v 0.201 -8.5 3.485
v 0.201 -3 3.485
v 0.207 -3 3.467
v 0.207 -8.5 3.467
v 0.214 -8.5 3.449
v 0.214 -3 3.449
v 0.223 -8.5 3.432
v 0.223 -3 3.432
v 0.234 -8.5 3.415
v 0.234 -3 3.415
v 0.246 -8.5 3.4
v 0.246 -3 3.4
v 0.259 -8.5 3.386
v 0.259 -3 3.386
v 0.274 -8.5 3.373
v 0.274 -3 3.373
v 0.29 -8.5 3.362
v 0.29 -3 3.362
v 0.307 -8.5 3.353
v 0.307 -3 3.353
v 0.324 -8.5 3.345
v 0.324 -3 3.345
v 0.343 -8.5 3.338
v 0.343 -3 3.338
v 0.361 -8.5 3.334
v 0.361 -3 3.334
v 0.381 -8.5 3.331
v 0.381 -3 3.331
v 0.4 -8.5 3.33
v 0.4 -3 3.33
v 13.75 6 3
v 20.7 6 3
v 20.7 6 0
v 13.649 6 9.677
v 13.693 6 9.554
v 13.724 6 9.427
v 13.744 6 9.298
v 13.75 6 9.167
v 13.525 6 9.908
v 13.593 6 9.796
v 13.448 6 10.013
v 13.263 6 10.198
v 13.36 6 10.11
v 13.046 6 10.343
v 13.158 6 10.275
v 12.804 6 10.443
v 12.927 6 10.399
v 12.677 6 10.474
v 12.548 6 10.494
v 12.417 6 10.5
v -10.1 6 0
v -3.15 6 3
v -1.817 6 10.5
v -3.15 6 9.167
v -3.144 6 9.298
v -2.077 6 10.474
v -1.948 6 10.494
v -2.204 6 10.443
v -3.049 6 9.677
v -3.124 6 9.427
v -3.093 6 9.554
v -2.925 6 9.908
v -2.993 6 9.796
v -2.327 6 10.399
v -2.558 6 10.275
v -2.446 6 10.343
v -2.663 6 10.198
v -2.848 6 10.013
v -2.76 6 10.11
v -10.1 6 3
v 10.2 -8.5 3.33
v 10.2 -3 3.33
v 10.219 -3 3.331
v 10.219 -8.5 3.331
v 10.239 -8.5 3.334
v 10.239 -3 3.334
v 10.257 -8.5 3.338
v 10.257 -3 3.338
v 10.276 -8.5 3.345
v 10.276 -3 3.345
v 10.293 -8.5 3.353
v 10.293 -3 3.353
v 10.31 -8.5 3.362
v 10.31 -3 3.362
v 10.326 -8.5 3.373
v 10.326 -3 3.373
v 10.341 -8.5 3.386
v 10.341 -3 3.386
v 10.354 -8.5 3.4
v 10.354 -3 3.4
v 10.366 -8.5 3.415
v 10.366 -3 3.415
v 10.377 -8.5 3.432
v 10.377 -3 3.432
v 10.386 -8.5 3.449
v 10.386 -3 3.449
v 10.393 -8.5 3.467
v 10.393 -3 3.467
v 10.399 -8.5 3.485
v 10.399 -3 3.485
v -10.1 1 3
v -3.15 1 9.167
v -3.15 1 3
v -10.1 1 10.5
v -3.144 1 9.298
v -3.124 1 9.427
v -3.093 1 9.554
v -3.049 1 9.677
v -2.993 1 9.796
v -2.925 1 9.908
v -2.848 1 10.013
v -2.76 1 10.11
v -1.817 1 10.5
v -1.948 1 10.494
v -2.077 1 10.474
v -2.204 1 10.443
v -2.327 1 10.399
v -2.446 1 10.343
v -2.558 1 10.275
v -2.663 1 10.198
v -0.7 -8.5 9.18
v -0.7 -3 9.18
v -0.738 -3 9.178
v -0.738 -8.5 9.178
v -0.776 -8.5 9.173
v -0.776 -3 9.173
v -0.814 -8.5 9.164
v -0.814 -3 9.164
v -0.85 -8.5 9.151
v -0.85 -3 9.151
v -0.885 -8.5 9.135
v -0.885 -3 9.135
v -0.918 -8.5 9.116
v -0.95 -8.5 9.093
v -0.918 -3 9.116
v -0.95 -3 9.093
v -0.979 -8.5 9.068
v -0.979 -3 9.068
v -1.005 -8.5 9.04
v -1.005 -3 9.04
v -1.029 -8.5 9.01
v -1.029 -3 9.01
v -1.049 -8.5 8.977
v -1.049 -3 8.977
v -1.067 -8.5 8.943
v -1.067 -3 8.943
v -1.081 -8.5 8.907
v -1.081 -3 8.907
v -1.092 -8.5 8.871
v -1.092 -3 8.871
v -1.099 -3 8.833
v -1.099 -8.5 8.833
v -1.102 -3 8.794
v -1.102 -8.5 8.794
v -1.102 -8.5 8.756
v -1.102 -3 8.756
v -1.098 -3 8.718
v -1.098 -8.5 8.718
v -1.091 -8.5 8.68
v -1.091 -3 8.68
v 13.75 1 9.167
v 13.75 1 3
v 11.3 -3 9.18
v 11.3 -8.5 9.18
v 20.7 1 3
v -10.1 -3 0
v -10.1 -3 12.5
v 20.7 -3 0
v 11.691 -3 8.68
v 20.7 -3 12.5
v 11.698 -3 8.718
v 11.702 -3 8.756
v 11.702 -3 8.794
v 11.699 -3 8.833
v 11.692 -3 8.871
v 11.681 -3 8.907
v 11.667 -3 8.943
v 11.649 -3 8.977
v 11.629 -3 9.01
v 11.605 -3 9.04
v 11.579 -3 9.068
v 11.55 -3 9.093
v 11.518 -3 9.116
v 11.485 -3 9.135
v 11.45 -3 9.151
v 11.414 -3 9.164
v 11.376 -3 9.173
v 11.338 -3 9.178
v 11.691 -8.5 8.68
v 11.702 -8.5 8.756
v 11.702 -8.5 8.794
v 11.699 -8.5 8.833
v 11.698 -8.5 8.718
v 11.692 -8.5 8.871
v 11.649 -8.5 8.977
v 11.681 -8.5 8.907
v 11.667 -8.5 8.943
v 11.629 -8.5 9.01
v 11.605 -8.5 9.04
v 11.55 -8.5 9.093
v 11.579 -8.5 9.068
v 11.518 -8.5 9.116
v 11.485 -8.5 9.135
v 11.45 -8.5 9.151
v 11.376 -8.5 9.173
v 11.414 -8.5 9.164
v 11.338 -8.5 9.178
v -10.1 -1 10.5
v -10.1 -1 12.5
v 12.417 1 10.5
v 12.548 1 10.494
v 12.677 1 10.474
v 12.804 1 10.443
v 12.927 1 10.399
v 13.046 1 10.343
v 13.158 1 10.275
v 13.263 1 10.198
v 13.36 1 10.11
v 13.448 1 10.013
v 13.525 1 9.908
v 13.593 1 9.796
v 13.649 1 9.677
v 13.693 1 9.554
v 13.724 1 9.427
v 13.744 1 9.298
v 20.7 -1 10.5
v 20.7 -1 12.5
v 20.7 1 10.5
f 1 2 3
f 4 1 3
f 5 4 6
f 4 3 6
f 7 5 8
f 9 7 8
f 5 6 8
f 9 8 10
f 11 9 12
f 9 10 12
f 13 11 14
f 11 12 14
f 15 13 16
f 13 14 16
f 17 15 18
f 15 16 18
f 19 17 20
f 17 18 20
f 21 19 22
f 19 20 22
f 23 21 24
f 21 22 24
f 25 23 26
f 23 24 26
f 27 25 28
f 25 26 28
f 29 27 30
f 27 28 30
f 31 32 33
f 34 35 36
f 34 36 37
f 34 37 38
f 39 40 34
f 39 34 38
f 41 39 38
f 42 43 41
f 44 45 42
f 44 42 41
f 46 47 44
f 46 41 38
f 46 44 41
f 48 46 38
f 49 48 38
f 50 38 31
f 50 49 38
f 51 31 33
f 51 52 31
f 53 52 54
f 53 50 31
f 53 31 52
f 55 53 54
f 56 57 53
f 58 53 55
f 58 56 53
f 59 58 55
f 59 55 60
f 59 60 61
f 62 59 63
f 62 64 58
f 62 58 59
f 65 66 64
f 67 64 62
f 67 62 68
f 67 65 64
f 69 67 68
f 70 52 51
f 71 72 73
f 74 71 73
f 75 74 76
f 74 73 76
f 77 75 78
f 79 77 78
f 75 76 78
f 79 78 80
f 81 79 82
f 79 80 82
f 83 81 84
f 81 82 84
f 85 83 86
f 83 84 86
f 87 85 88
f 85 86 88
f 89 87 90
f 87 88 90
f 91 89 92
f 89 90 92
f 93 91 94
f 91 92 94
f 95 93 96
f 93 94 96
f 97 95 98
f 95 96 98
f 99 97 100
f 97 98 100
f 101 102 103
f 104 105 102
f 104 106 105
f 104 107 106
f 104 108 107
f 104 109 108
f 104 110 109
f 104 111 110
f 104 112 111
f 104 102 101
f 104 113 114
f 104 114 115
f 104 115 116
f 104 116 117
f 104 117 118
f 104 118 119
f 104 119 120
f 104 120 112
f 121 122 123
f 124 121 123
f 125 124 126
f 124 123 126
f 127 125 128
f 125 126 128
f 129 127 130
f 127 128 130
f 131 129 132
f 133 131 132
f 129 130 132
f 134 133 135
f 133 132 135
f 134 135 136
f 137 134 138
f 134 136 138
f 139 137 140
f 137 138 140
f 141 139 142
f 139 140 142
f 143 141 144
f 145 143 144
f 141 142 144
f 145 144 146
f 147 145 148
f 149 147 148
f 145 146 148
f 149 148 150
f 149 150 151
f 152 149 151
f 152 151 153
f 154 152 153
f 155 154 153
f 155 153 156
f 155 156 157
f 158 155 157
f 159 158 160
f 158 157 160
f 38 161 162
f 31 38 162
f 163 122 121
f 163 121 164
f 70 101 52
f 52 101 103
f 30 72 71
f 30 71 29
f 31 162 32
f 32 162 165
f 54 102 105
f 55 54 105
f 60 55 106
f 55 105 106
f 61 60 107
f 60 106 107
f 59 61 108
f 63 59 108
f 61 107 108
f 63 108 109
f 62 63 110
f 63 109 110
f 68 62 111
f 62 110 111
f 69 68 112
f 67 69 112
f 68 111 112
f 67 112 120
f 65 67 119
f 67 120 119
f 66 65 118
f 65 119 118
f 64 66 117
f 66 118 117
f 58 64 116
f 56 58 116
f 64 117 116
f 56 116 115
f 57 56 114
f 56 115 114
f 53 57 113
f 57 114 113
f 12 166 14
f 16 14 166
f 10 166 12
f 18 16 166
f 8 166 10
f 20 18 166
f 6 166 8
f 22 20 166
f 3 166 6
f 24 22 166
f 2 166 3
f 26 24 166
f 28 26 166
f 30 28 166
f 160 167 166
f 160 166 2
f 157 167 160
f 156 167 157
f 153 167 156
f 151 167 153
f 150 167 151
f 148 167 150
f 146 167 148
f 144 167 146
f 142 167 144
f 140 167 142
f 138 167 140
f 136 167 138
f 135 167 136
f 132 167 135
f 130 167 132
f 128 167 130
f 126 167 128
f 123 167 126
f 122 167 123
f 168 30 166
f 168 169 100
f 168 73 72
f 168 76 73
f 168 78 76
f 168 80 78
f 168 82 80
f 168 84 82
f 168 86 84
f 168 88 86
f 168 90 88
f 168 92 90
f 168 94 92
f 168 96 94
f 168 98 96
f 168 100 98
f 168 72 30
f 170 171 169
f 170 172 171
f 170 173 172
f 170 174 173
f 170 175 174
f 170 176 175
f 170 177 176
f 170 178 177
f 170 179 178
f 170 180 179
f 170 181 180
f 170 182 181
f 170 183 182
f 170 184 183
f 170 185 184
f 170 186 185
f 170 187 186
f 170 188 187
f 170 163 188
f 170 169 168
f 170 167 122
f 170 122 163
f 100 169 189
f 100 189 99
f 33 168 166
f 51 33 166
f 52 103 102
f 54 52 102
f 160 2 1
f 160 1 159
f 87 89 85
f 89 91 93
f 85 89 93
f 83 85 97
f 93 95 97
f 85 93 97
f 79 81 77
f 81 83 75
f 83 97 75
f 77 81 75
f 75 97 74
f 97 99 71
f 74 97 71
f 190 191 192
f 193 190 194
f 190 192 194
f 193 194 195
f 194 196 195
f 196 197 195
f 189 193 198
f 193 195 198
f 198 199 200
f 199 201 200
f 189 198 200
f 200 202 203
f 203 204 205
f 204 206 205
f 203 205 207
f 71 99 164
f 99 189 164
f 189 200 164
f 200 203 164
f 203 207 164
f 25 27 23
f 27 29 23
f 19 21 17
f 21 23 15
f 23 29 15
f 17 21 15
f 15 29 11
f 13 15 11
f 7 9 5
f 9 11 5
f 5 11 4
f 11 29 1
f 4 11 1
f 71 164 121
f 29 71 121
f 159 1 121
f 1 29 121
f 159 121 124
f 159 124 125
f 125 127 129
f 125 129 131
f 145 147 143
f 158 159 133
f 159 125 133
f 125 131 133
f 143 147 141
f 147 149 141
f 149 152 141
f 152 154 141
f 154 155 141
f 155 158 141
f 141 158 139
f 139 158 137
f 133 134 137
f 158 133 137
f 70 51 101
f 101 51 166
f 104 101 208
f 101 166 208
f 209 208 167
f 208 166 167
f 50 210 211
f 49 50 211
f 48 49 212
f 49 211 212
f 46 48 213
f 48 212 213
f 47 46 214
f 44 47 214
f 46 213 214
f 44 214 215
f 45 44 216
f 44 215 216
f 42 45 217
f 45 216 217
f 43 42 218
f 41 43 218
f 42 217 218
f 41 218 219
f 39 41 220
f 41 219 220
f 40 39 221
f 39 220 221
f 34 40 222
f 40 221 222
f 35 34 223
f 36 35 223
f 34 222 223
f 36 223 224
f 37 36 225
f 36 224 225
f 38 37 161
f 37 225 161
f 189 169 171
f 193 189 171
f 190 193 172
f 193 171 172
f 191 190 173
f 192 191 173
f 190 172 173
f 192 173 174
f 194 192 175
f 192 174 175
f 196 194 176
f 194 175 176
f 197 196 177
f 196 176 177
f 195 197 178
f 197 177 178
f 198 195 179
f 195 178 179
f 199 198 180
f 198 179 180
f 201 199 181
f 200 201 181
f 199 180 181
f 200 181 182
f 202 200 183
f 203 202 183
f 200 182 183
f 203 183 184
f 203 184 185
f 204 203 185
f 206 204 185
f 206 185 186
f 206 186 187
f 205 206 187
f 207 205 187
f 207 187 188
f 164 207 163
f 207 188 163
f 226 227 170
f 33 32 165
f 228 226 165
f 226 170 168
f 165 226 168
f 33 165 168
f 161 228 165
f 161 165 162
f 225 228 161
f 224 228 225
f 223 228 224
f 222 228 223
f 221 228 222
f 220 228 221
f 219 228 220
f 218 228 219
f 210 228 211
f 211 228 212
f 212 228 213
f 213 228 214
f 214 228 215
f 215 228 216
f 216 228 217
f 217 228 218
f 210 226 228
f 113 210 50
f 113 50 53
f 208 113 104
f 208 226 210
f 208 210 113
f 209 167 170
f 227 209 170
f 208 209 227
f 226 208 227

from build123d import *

# Parameters (mm, degrees)
SKETCH008_W          = 30.8
SKETCH008_H          = 12.5
PAD006_DEPTH         = 2
SKETCH009_W          = 30.8
SKETCH009_H          = 10.5
PAD007_DEPTH         = 2
PAD067_DEPTH         = 5
PAD115_DEPTH         = 5.5
BODY_PLACEMENT_ANGLE = 180


with BuildPart() as part:
    # Sketch008 → Pad006 (new body)
    with BuildSketch(Plane(origin=(0, 3, 0), x_dir=(-1, 0, 0), z_dir=(0, 1, 0))):
        with Locations((0, 6.25)):
            Rectangle(SKETCH008_W, SKETCH008_H)
    extrude(amount=-PAD006_DEPTH)

    # Sketch009 → Pad007 (join)
    with BuildSketch(Plane.XZ.offset(-1)):
        with Locations((0, 5.25)):
            Rectangle(SKETCH009_W, SKETCH009_H)
    extrude(amount=PAD007_DEPTH)

    # Sketch010 → Pad067 (join)
    with BuildSketch(Plane.XZ.offset(1)):
        with BuildLine():
            Line((15.4, 0), (15.4, 3))
            Line((15.4, 3), (8.45, 3))
            Line((8.45, 3), (8.45, 9.167398))
            ThreePointArc((8.45, 9.167398), (8.05969, 10.10969), (7.117398, 10.5))
            Line((7.117398, 10.5), (-7.117398, 10.5))
            ThreePointArc((-7.117398, 10.5), (-8.05969, 10.10969), (-8.45, 9.167398))
            Line((-8.45, 9.167398), (-8.45, 3))
            Line((-8.45, 3), (-15.4, 3))
            Line((-15.4, 3), (-15.4, 0))
            Line((-15.4, 0), (15.4, 0))
        make_face()
    extrude(amount=PAD067_DEPTH)

    # Sketch094 → Pad115 (join)
    with BuildSketch(Plane(origin=(0, 3, 0), x_dir=(-1, 0, 0), z_dir=(0, 1, 0))):
        with BuildLine():
            Line((-6, 9.18), (6, 9.18))
            ThreePointArc((6.390856, 8.68), (6.31732, 9.025285), (6, 9.18))
            Line((6.390856, 8.68), (5.098578, 3.485231))
            ThreePointArc((4.9, 3.33), (5.026026, 3.373413), (5.098578, 3.485231))
            Line((4.9, 3.33), (-4.9, 3.33))
            ThreePointArc((-5.098578, 3.485231), (-5.026026, 3.373413), (-4.9, 3.33))
            Line((-5.098578, 3.485231), (-6.390856, 8.68))
            ThreePointArc((-6, 9.18), (-6.31732, 9.025285), (-6.390856, 8.68))
        make_face()
    extrude(amount=PAD115_DEPTH)


with BuildPart() as part_1:
    # Body placement: moved
    add(part.part.moved(Location((5.3, 0, 0))).rotate(Axis((5.3, 0, 0), (0, 0, 1)), BODY_PLACEMENT_ANGLE))


solid = part_1.part
